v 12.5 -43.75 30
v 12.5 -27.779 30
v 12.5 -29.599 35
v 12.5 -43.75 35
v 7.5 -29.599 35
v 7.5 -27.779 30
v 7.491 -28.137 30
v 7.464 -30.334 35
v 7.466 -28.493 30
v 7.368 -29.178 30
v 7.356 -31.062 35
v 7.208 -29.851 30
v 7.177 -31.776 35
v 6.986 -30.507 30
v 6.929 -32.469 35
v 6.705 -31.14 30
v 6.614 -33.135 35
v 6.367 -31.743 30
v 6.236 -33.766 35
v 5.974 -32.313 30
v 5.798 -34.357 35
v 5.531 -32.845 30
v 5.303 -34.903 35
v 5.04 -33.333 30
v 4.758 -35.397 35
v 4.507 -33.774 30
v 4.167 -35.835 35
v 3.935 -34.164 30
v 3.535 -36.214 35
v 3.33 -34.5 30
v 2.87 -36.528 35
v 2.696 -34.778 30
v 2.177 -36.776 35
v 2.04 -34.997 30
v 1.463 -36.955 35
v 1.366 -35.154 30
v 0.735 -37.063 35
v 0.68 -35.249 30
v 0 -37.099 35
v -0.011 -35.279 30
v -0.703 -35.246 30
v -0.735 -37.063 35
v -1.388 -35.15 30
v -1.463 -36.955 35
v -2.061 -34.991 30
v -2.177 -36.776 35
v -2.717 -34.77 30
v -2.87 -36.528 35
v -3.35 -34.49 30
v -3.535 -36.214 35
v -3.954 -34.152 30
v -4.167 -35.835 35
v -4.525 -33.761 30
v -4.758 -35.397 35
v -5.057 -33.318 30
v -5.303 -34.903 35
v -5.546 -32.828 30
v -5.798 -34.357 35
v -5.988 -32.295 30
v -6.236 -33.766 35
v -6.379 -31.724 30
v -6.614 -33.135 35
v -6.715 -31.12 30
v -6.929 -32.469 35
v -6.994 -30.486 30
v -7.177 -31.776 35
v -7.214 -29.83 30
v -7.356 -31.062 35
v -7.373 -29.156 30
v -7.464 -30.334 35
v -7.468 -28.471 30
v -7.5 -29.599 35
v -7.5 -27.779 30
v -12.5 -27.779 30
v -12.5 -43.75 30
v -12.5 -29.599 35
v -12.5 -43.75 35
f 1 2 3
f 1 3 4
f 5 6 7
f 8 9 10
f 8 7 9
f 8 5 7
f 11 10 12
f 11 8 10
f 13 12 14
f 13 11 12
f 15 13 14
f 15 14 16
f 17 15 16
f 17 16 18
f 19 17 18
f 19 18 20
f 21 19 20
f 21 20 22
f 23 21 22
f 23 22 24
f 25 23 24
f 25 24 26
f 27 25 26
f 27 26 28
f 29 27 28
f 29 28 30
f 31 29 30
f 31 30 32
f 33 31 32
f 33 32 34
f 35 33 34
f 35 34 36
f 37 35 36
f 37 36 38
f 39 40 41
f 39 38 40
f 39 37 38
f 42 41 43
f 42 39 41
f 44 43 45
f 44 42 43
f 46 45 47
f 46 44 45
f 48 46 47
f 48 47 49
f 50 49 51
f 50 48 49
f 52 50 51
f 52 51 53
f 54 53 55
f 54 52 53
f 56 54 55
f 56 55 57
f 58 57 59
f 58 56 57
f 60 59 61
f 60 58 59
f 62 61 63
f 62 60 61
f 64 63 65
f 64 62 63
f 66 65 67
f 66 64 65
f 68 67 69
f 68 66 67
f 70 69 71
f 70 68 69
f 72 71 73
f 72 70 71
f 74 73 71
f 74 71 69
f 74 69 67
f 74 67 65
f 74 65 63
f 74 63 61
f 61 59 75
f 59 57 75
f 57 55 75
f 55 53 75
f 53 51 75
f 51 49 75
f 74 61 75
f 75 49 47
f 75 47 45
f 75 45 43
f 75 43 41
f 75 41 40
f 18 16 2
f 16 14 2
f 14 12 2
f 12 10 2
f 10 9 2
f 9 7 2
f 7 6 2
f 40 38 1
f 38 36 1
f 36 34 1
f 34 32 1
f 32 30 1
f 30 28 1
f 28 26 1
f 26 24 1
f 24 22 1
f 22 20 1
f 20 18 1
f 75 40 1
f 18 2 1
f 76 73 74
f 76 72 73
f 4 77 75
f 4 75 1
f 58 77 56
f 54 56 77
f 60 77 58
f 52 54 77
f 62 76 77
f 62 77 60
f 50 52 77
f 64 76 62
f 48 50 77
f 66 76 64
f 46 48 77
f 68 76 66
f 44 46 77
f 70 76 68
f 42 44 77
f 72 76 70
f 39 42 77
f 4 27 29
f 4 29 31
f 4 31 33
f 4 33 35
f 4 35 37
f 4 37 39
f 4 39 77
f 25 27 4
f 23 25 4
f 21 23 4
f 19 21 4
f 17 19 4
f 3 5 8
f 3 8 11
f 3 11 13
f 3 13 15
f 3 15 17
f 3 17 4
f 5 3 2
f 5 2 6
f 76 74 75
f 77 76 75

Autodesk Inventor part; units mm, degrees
ref_plane "YZ Plane" through (0, 0, 0) normal (1, 0, 0) x (0, 1, 0)
sketch "Sketch1" plane through (0, 0, 0) normal (0, 0, 1) x (1, 0, 0)
  line L0 (-12.5, 12.5) -> (12.5, 12.5)
  line L1 (12.5, 12.5) -> (12.5, -37.5)
  line L2 (12.5, -37.5) -> (-12.5, -37.5)
  line L3 (-12.5, -37.5) -> (-12.5, 12.5)
  point P0 (0, 0)
  dimension "d0" = 25
  dimension "d1" = 50
  dimension "d2" = 12.5
  dimension "d3" = 12.5
extrude "Extrusion1" add sketch "Sketch1" along normal blind 10
sketch "Sketch3" plane through (0, 0, 10) normal (0, 0, 1) x (1, 0, 0)
  arc A0 (7.5, 0) -> (-7.5, 0) centre (0, 0) ccw
  line L0 (-7.5, 0) -> (-12.5, 0)
  line L1 (-12.5, 12.5) -> (-12.5, -37.5) projected
  line L2 (-12.5, 0) -> (-12.5, 12.5)
  line L3 (12.5, 12.5) -> (-12.5, 12.5) projected
  line L4 (12.5, 12.5) -> (12.5, 0)
  line L5 (12.5, -37.5) -> (12.5, 12.5) projected
  line L6 (7.5, 0) -> (12.5, 0)
  dimension "d11" = 15
extrude "Extrusion3" add sketch "Sketch3" along normal blind 15
sketch "Sketch4" plane through (0, 0, 25) normal (0, 0, 1) x (1, 0, 0)
  line L0 (-12.5, 12.5) -> (-12.5, 0) projected
  line L1 (-12.5, 12.5) -> (12.5, 12.5)
  line L2 (12.5, 12.5) -> (12.5, -17.5)
  line L3 (12.5, -17.5) -> (-12.5, -17.5)
  line L4 (-12.5, -17.5) -> (-12.5, 12.5)
  point P0 (0, 0)
  dimension "d14" = 25
  dimension "d21" = 30
extrude "Extrusion4" add sketch "Sketch4" along normal blind 10
sketch "Sketch5" plane through (0, 0, 0) normal (0, 0, -1) x (-1, 0, 0)
  circle A0 centre (0, 0) radius 7.5
  dimension "d18" = 15
extrude "Extrusion5" cut sketch "Sketch5" against normal blind 10
sketch "Sketch6" plane through (0, 0, 10) normal (0, 0, 1) x (1, 0, 0)
  line L0 (-12.5, -20.5) -> (-12.5, -37.5)
  line L1 (-12.5, -37.5) -> (12.5, -37.5) projected
  line L2 (-12.5, -37.5) -> (12.5, -37.5)
  line L3 (12.5, -37.5) -> (12.5, -20.5)
  line L4 (12.5, -37.5) -> (12.5, 0) projected
  arc A0 (-7.5, -20.5) -> (7.5, -20.5) centre (0, -20.5) ccw
  line L5 (-12.5, -20.5) -> (-7.5, -20.5)
  line L6 (7.5, -20.5) -> (12.5, -20.5)
  line L7 (-12.5, 0) -> (-12.5, -37.5) projected
  line L8 (-12.5, -29) -> (12.5, -29)
  point P0 (0, 0)
  dimension "d22" = 15
  dimension "d23" = 17
  dimension "d24" = 17
ref_plane "Work Plane1" through (0, -37.5, 0) normal (-1, 0, 0) x (0, 0, 1)
sketch "Sketch8" plane through (0, -37.5, 0) normal (-1, 0, 0) x (0, 0, 1)
  line L0 (10, 0) -> (10, 37.5) projected
  line L1 (10, 8.5) -> (35, -0.5993)
  line L2 (10, 8.5) -> (36.6044, 8.5) construction
  line L3 (0, 0) -> (10, 0) projected
  point P0 (0, 37.5)
  dimension "d26" = 20
  dimension "d27" = 8.5
  dimension "d32" = 25
sweep "Sweep1" add profiles "Sketch6" path "Sketch8" path curves L1
sketch "Sketch9" plane through (12.5, -37.5, 0) normal (1, 0, 0) x (0, 0, -1)
  point P0 (0, 37.5)
sketch "Sketch10" plane through (12.5, -37.5, 0) normal (1, 0, 0) x (0, 0, -1)
  line L0 (-25, 37.5) -> (-25, 45) projected
  line L1 (-25, 37.5) -> (0, 37.5)
  line L2 (0, 37.5) -> (0, -8.9712)
  line L3 (0, -8.9712) -> (-25, -8.9712)
  line L4 (-25, -8.9712) -> (-25, 37.5)
extrude "Extrusion6" cut sketch "Sketch10" against normal up to surface (25 mm away)
sketch "Sketch11" plane through (0, 0, 35) normal (0, 0, 1) x (1, 0, 0)
  line L0 (12.5, 12.5) -> (-12.5, 12.5) projected
  line L1 (12.5, -17.5) -> (12.5, 0) projected
  line L2 (-12.5, 12.5) -> (12.5, 12.5)
  line L3 (12.5, 12.5) -> (12.5, -17.5)
  line L4 (12.5, -17.5) -> (-12.5, -17.5)
  line L5 (-12.5, -17.5) -> (-12.5, 12.5)
  point P0 (0, 0)
extrude "Extrusion7" cut sketch "Sketch11" against normal up to surface (35 mm away)
sketch "Sketch12" plane through (12.5, -46.5993, 35) normal (1, 0, 0) x (0, 0, -1)
  line L0 (10, 20.6397) -> (0, 17) projected
  line L1 (10, 20.6397) -> (5, 20.6397)
  line L2 (5, 20.6397) -> (5, 0)
  line L3 (5, 0) -> (10, 0)
  line L4 (10, 0) -> (10, 20.6397)
  point P0 (35, 46.5993)
  point P1 (5, 18.8199)
  dimension "d37" = 5
extrude "Extrusion8" cut sketch "Sketch12" against normal up to surface (25 mm away) contours L4 L3 L2 L0
ref_plane "Work Plane2" through (0, -43.75, 0) normal (0, 1, 0) x (-1, 0, 0)
sketch "Sketch15" plane through (0, -43.75, 0) normal (0, 1, 0) x (-1, 0, 0)
  line L0 (12.5, 35) -> (-12.5, 35) projected
  line L1 (-12.5, 30) -> (-7.5, 30) projected
  line L2 (12.5, 35) -> (-12.5, 35)
  line L3 (-12.5, 35) -> (-12.5, 30)
  line L4 (-12.5, 30) -> (12.5, 30)
  line L5 (12.5, 30) -> (12.5, 35)
  point P0 (0, 0)
extrude "Extrusion10" add sketch "Sketch15" against normal blind 3
sketch "Sketch16" plane through (0, -46.75, 0) normal (0, -1, 0) x (1, 0, 0)
  line L0 (-12.5, 30) -> (-12.5, 35) projected
  line L1 (12.5, 30) -> (7.5, 30) projected
  line L2 (-12.5, 35) -> (12.5, 35)
  line L3 (12.5, 35) -> (12.5, 30)
  line L4 (12.5, 30) -> (-12.5, 30)
  line L5 (-12.5, 30) -> (-12.5, 35)
  point P0 (0, 0)
extrude "Extrusion11" cut sketch "Sketch16" against normal blind 3
equation "\"d2\" = 0.5 * d0"
equation "\"d24\" = d23"
properties part number "Follower Ramp"
